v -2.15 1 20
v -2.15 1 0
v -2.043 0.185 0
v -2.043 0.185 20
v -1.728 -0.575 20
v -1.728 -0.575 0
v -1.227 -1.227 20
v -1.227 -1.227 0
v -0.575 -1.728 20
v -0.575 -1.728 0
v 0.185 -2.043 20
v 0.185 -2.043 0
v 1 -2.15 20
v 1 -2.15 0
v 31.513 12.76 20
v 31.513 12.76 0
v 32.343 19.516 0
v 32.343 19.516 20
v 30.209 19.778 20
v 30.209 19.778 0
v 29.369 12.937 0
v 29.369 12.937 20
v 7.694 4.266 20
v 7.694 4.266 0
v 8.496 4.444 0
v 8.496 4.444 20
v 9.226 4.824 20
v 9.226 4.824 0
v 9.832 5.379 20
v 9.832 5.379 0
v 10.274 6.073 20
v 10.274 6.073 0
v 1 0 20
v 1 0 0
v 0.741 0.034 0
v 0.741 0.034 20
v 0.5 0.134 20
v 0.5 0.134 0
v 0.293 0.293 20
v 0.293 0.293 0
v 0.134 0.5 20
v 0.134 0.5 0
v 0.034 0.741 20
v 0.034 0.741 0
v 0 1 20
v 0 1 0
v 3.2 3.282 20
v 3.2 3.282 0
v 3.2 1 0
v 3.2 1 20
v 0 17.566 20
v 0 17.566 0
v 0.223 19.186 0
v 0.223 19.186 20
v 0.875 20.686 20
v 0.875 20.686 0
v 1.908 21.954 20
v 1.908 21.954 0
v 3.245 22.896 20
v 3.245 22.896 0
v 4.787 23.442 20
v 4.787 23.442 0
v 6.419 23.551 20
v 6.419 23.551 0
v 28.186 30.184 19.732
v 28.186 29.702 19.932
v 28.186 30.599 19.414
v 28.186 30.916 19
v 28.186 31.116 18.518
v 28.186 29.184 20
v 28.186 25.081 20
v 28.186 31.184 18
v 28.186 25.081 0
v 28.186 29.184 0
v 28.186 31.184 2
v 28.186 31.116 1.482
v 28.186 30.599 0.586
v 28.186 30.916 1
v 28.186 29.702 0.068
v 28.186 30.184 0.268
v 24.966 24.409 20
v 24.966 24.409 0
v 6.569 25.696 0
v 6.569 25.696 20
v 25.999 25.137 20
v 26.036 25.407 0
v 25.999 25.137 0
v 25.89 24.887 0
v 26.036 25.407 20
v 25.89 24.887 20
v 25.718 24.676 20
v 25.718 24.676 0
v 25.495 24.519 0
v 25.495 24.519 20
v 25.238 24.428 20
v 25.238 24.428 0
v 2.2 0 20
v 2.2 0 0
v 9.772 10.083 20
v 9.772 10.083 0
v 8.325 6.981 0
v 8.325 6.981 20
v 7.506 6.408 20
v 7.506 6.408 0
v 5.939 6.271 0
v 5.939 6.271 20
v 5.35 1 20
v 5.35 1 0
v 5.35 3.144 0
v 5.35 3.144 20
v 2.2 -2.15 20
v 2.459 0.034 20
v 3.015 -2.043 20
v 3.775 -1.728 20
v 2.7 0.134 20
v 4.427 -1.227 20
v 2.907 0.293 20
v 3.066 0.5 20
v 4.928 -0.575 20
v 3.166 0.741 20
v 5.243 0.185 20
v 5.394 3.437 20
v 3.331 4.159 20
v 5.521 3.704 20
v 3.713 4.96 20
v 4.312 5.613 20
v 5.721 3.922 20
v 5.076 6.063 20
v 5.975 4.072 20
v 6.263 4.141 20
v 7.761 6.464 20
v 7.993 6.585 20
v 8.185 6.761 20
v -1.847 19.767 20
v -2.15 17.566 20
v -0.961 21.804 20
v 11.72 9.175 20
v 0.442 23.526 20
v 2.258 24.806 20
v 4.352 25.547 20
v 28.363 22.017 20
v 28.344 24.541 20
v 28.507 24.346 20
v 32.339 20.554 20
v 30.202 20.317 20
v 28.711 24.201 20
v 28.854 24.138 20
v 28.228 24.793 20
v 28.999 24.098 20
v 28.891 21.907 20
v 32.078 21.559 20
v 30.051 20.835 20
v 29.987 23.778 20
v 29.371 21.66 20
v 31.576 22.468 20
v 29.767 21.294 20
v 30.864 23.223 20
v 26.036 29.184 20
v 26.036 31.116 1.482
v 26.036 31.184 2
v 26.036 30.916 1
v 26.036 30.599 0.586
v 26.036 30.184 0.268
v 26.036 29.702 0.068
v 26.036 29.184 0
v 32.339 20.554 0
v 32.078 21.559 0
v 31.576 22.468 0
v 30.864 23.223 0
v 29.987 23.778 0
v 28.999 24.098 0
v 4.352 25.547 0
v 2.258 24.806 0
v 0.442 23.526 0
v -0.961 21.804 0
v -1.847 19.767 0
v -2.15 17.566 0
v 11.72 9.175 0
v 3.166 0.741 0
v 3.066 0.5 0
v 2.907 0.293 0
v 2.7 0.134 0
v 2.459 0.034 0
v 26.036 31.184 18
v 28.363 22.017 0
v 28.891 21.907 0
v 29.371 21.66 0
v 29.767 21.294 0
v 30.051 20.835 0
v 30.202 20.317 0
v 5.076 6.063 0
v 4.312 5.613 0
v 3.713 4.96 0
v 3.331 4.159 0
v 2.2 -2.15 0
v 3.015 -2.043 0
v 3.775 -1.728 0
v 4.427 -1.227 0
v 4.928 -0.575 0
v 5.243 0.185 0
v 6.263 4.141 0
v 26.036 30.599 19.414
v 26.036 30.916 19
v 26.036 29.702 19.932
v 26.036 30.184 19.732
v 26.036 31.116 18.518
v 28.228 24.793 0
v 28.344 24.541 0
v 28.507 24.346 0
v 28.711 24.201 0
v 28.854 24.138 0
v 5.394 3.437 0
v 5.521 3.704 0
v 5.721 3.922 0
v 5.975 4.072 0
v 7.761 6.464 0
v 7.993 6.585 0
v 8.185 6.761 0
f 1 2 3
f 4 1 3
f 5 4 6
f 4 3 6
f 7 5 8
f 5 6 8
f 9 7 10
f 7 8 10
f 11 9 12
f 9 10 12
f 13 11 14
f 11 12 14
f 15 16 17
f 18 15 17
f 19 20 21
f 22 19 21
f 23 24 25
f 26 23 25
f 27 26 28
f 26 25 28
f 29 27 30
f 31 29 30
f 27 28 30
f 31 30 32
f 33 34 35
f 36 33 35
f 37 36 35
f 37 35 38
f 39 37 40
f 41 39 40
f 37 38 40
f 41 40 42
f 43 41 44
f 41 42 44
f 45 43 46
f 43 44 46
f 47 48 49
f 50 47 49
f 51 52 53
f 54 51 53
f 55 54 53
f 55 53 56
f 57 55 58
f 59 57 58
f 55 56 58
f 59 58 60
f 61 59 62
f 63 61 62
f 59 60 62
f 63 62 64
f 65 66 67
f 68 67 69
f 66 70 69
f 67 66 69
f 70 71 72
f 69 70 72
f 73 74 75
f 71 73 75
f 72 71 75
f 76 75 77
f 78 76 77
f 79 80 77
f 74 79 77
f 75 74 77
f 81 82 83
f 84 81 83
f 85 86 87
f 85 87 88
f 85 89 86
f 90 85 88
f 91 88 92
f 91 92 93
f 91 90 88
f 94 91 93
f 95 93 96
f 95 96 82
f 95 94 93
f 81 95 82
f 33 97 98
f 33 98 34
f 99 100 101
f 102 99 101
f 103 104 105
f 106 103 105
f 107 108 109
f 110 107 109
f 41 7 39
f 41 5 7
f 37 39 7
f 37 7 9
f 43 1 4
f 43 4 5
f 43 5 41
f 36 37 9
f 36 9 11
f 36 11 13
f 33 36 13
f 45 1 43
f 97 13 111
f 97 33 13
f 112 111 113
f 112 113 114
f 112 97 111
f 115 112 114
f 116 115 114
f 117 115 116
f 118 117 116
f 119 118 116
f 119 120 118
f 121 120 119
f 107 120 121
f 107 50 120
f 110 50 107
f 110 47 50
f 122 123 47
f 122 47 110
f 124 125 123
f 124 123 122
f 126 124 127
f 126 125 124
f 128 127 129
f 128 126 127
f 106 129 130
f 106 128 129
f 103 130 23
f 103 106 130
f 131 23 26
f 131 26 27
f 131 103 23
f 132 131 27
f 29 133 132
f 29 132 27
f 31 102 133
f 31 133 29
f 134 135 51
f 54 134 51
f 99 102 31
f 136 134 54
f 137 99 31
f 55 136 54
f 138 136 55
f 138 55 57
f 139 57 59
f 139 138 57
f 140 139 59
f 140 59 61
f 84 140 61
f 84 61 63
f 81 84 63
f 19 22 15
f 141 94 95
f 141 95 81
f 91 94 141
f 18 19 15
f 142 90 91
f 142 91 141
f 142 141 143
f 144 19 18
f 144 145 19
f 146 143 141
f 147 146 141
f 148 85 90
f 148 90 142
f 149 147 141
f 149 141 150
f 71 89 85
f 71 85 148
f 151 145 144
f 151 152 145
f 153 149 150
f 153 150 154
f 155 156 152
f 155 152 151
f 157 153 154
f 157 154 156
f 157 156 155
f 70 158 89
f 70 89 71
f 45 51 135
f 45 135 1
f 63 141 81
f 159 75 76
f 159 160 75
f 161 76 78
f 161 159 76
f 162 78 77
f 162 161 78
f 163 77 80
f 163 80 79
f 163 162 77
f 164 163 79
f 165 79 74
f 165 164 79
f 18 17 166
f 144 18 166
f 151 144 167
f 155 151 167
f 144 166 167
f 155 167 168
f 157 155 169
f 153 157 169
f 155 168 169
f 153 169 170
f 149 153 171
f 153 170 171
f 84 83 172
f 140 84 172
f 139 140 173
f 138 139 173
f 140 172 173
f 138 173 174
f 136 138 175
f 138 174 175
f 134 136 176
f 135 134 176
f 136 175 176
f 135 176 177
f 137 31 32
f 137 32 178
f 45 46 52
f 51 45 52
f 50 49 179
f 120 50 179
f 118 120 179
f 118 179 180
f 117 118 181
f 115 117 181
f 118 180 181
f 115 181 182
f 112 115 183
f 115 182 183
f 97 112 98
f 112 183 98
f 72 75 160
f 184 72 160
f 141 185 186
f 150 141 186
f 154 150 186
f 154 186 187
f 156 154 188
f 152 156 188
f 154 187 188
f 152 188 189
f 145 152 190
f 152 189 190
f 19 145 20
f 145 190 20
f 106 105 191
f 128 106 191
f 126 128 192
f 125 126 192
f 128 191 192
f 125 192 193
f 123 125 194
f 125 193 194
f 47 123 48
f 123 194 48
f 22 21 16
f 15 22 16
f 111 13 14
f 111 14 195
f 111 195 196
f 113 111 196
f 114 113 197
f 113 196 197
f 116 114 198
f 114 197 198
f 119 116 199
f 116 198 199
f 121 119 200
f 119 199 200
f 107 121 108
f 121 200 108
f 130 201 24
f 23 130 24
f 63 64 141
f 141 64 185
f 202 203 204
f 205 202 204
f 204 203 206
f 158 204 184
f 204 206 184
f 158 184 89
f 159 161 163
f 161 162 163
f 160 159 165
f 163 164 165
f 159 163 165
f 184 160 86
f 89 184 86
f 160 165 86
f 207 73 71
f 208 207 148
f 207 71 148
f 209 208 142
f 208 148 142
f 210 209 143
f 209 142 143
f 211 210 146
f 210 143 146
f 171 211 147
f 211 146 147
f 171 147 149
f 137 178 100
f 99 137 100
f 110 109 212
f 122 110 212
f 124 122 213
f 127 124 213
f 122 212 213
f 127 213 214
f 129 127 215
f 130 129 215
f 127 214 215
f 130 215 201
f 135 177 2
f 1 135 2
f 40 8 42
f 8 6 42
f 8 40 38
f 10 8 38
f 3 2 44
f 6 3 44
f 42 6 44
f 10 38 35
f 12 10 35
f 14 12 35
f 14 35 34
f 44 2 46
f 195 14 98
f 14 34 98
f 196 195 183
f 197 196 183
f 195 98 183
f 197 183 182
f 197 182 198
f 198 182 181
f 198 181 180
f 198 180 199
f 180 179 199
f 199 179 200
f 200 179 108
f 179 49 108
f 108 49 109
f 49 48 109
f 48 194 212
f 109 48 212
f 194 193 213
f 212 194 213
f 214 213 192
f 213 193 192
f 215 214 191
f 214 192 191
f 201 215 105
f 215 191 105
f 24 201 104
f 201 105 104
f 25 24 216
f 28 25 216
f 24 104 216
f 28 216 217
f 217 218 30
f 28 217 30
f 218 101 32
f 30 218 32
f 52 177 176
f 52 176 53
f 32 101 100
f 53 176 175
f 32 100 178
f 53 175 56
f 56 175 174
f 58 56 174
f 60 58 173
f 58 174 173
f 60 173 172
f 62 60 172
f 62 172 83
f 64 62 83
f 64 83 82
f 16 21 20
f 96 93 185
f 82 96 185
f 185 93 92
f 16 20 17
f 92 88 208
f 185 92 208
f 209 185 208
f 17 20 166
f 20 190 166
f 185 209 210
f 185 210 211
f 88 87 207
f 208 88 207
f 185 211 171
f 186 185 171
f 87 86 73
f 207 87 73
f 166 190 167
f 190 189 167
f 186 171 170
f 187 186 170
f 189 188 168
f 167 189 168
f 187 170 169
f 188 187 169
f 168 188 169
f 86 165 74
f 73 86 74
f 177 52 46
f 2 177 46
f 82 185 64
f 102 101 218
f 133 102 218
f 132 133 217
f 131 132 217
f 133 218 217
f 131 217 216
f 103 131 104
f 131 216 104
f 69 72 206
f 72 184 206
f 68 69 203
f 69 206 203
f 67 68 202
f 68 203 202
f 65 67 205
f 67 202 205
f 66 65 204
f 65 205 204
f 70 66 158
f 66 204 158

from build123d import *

# Parameters (mm, degrees)
F1_DEPTH = 20
F2_R     = 2
F3_R     = 1


with BuildPart() as f1:
    # F0 (on Top) → F1 (new body)
    with BuildSketch(Plane.XY):
        with BuildLine():
            ThreePointArc((1, 0), (0.2928932188, 0.2928932188), (0, 1))
            Line((0, 1), (0, 17.5657877399))
            ThreePointArc((0, 17.5657877399), (1.9080098396, 21.9539099496), (6.4185388425, 23.5511720414))
            Line((6.4185388425, 23.5511720414), (28.3631797552, 22.0166532631))
            ThreePointArc((28.3631797552, 22.0166532631), (29.7669159745, 21.2936816032), (30.208759111, 19.7777864758))
            Line((30.208759111, 19.7777864758), (29.3687820043, 12.9367219271))
            Line((29.3687820043, 12.9367219271), (31.5132220522, 12.7599401181))
            Line((31.5132220522, 12.7599401181), (32.342733337, 19.5157673875))
            ThreePointArc((32.342733337, 19.5157673875), (31.4259088288, 22.6612497768), (28.5131561738, 24.1614159712))
            Line((28.5131561738, 24.1614159712), (28.1860586203, 24.1842888603))
            Line((28.1860586203, 24.1842888603), (26.0360586203, 24.1842888603))
            Line((26.0360586203, 24.1842888603), (26.0360586203, 24.334631506))
            Line((26.0360586203, 24.334631506), (6.568515261, 25.6959347495))
            ThreePointArc((6.568515261, 25.6959347495), (0.4417133655, 23.526320408), (-2.15, 17.5657877399))
            Line((-2.15, 17.5657877399), (-2.15, 1))
            ThreePointArc((-2.15, 1), (-1.2273863607, -1.2273863607), (1, -2.15))
            Line((1, -2.15), (2.2, -2.15))
            ThreePointArc((2.2, -2.15), (4.4273863607, -1.2273863607), (5.35, 1))
            Line((5.35, 1), (5.35, 3.1444985108))
            ThreePointArc((5.35, 3.1444985108), (5.6127226632, 3.8200887184), (6.2628442573, 4.1406932089))
            Line((6.2628442573, 4.1406932089), (7.6935855904, 4.2658668559))
            ThreePointArc((7.6935855904, 4.2658668559), (9.2258107753, 4.8235512154), (10.27391453, 6.0726326305))
            Line((10.27391453, 6.0726326305), (11.7203888097, 9.1746067338))
            Line((11.7203888097, 9.1746067338), (9.7718270676, 10.0832359965))
            Line((9.7718270676, 10.0832359965), (8.3253527878, 6.9812618932))
            ThreePointArc((8.3253527878, 6.9812618932), (7.9926214371, 6.5847281106), (7.5062007435, 6.4076854568))
            Line((7.5062007435, 6.4076854568), (5.9385327718, 6.2705322811))
            ThreePointArc((5.9385327718, 6.2705322811), (3.9881679896, 5.3087188097), (3.2, 3.2819481869))
            Line((3.2, 3.2819481869), (3.2, 1))
            ThreePointArc((3.2, 1), (2.9071067812, 0.2928932188), (2.2, 0))
            Line((2.2, 0), (1, 0))
        make_face()
        Polygon((26.0360586203, 24.1842888603), (28.1860586203, 24.1842888603), (26.0360586203, 24.334631506), align=None)
        Polygon((26.0360586203, 24.334631506), (28.1860586203, 24.1842888603), (28.1860586203, 31.1842888603), (26.0360586203, 31.1842888603), align=None)
    extrude(amount=F1_DEPTH)

    # F2
    f2_edges = [f1.edges().sort_by_distance(p)[0] for p in [
        (27.111059, 31.184289, 20),
        (27.111059, 31.184289, 0),
    ]]
    fillet(f2_edges, radius=F2_R)

    # F3
    f3_edges = [f1.edges().sort_by_distance(p)[0] for p in [
        (26.036059, 24.334632, 10),
        (28.186059, 24.184289, 10),
    ]]
    fillet(f3_edges, radius=F3_R)


solid = f1.part
